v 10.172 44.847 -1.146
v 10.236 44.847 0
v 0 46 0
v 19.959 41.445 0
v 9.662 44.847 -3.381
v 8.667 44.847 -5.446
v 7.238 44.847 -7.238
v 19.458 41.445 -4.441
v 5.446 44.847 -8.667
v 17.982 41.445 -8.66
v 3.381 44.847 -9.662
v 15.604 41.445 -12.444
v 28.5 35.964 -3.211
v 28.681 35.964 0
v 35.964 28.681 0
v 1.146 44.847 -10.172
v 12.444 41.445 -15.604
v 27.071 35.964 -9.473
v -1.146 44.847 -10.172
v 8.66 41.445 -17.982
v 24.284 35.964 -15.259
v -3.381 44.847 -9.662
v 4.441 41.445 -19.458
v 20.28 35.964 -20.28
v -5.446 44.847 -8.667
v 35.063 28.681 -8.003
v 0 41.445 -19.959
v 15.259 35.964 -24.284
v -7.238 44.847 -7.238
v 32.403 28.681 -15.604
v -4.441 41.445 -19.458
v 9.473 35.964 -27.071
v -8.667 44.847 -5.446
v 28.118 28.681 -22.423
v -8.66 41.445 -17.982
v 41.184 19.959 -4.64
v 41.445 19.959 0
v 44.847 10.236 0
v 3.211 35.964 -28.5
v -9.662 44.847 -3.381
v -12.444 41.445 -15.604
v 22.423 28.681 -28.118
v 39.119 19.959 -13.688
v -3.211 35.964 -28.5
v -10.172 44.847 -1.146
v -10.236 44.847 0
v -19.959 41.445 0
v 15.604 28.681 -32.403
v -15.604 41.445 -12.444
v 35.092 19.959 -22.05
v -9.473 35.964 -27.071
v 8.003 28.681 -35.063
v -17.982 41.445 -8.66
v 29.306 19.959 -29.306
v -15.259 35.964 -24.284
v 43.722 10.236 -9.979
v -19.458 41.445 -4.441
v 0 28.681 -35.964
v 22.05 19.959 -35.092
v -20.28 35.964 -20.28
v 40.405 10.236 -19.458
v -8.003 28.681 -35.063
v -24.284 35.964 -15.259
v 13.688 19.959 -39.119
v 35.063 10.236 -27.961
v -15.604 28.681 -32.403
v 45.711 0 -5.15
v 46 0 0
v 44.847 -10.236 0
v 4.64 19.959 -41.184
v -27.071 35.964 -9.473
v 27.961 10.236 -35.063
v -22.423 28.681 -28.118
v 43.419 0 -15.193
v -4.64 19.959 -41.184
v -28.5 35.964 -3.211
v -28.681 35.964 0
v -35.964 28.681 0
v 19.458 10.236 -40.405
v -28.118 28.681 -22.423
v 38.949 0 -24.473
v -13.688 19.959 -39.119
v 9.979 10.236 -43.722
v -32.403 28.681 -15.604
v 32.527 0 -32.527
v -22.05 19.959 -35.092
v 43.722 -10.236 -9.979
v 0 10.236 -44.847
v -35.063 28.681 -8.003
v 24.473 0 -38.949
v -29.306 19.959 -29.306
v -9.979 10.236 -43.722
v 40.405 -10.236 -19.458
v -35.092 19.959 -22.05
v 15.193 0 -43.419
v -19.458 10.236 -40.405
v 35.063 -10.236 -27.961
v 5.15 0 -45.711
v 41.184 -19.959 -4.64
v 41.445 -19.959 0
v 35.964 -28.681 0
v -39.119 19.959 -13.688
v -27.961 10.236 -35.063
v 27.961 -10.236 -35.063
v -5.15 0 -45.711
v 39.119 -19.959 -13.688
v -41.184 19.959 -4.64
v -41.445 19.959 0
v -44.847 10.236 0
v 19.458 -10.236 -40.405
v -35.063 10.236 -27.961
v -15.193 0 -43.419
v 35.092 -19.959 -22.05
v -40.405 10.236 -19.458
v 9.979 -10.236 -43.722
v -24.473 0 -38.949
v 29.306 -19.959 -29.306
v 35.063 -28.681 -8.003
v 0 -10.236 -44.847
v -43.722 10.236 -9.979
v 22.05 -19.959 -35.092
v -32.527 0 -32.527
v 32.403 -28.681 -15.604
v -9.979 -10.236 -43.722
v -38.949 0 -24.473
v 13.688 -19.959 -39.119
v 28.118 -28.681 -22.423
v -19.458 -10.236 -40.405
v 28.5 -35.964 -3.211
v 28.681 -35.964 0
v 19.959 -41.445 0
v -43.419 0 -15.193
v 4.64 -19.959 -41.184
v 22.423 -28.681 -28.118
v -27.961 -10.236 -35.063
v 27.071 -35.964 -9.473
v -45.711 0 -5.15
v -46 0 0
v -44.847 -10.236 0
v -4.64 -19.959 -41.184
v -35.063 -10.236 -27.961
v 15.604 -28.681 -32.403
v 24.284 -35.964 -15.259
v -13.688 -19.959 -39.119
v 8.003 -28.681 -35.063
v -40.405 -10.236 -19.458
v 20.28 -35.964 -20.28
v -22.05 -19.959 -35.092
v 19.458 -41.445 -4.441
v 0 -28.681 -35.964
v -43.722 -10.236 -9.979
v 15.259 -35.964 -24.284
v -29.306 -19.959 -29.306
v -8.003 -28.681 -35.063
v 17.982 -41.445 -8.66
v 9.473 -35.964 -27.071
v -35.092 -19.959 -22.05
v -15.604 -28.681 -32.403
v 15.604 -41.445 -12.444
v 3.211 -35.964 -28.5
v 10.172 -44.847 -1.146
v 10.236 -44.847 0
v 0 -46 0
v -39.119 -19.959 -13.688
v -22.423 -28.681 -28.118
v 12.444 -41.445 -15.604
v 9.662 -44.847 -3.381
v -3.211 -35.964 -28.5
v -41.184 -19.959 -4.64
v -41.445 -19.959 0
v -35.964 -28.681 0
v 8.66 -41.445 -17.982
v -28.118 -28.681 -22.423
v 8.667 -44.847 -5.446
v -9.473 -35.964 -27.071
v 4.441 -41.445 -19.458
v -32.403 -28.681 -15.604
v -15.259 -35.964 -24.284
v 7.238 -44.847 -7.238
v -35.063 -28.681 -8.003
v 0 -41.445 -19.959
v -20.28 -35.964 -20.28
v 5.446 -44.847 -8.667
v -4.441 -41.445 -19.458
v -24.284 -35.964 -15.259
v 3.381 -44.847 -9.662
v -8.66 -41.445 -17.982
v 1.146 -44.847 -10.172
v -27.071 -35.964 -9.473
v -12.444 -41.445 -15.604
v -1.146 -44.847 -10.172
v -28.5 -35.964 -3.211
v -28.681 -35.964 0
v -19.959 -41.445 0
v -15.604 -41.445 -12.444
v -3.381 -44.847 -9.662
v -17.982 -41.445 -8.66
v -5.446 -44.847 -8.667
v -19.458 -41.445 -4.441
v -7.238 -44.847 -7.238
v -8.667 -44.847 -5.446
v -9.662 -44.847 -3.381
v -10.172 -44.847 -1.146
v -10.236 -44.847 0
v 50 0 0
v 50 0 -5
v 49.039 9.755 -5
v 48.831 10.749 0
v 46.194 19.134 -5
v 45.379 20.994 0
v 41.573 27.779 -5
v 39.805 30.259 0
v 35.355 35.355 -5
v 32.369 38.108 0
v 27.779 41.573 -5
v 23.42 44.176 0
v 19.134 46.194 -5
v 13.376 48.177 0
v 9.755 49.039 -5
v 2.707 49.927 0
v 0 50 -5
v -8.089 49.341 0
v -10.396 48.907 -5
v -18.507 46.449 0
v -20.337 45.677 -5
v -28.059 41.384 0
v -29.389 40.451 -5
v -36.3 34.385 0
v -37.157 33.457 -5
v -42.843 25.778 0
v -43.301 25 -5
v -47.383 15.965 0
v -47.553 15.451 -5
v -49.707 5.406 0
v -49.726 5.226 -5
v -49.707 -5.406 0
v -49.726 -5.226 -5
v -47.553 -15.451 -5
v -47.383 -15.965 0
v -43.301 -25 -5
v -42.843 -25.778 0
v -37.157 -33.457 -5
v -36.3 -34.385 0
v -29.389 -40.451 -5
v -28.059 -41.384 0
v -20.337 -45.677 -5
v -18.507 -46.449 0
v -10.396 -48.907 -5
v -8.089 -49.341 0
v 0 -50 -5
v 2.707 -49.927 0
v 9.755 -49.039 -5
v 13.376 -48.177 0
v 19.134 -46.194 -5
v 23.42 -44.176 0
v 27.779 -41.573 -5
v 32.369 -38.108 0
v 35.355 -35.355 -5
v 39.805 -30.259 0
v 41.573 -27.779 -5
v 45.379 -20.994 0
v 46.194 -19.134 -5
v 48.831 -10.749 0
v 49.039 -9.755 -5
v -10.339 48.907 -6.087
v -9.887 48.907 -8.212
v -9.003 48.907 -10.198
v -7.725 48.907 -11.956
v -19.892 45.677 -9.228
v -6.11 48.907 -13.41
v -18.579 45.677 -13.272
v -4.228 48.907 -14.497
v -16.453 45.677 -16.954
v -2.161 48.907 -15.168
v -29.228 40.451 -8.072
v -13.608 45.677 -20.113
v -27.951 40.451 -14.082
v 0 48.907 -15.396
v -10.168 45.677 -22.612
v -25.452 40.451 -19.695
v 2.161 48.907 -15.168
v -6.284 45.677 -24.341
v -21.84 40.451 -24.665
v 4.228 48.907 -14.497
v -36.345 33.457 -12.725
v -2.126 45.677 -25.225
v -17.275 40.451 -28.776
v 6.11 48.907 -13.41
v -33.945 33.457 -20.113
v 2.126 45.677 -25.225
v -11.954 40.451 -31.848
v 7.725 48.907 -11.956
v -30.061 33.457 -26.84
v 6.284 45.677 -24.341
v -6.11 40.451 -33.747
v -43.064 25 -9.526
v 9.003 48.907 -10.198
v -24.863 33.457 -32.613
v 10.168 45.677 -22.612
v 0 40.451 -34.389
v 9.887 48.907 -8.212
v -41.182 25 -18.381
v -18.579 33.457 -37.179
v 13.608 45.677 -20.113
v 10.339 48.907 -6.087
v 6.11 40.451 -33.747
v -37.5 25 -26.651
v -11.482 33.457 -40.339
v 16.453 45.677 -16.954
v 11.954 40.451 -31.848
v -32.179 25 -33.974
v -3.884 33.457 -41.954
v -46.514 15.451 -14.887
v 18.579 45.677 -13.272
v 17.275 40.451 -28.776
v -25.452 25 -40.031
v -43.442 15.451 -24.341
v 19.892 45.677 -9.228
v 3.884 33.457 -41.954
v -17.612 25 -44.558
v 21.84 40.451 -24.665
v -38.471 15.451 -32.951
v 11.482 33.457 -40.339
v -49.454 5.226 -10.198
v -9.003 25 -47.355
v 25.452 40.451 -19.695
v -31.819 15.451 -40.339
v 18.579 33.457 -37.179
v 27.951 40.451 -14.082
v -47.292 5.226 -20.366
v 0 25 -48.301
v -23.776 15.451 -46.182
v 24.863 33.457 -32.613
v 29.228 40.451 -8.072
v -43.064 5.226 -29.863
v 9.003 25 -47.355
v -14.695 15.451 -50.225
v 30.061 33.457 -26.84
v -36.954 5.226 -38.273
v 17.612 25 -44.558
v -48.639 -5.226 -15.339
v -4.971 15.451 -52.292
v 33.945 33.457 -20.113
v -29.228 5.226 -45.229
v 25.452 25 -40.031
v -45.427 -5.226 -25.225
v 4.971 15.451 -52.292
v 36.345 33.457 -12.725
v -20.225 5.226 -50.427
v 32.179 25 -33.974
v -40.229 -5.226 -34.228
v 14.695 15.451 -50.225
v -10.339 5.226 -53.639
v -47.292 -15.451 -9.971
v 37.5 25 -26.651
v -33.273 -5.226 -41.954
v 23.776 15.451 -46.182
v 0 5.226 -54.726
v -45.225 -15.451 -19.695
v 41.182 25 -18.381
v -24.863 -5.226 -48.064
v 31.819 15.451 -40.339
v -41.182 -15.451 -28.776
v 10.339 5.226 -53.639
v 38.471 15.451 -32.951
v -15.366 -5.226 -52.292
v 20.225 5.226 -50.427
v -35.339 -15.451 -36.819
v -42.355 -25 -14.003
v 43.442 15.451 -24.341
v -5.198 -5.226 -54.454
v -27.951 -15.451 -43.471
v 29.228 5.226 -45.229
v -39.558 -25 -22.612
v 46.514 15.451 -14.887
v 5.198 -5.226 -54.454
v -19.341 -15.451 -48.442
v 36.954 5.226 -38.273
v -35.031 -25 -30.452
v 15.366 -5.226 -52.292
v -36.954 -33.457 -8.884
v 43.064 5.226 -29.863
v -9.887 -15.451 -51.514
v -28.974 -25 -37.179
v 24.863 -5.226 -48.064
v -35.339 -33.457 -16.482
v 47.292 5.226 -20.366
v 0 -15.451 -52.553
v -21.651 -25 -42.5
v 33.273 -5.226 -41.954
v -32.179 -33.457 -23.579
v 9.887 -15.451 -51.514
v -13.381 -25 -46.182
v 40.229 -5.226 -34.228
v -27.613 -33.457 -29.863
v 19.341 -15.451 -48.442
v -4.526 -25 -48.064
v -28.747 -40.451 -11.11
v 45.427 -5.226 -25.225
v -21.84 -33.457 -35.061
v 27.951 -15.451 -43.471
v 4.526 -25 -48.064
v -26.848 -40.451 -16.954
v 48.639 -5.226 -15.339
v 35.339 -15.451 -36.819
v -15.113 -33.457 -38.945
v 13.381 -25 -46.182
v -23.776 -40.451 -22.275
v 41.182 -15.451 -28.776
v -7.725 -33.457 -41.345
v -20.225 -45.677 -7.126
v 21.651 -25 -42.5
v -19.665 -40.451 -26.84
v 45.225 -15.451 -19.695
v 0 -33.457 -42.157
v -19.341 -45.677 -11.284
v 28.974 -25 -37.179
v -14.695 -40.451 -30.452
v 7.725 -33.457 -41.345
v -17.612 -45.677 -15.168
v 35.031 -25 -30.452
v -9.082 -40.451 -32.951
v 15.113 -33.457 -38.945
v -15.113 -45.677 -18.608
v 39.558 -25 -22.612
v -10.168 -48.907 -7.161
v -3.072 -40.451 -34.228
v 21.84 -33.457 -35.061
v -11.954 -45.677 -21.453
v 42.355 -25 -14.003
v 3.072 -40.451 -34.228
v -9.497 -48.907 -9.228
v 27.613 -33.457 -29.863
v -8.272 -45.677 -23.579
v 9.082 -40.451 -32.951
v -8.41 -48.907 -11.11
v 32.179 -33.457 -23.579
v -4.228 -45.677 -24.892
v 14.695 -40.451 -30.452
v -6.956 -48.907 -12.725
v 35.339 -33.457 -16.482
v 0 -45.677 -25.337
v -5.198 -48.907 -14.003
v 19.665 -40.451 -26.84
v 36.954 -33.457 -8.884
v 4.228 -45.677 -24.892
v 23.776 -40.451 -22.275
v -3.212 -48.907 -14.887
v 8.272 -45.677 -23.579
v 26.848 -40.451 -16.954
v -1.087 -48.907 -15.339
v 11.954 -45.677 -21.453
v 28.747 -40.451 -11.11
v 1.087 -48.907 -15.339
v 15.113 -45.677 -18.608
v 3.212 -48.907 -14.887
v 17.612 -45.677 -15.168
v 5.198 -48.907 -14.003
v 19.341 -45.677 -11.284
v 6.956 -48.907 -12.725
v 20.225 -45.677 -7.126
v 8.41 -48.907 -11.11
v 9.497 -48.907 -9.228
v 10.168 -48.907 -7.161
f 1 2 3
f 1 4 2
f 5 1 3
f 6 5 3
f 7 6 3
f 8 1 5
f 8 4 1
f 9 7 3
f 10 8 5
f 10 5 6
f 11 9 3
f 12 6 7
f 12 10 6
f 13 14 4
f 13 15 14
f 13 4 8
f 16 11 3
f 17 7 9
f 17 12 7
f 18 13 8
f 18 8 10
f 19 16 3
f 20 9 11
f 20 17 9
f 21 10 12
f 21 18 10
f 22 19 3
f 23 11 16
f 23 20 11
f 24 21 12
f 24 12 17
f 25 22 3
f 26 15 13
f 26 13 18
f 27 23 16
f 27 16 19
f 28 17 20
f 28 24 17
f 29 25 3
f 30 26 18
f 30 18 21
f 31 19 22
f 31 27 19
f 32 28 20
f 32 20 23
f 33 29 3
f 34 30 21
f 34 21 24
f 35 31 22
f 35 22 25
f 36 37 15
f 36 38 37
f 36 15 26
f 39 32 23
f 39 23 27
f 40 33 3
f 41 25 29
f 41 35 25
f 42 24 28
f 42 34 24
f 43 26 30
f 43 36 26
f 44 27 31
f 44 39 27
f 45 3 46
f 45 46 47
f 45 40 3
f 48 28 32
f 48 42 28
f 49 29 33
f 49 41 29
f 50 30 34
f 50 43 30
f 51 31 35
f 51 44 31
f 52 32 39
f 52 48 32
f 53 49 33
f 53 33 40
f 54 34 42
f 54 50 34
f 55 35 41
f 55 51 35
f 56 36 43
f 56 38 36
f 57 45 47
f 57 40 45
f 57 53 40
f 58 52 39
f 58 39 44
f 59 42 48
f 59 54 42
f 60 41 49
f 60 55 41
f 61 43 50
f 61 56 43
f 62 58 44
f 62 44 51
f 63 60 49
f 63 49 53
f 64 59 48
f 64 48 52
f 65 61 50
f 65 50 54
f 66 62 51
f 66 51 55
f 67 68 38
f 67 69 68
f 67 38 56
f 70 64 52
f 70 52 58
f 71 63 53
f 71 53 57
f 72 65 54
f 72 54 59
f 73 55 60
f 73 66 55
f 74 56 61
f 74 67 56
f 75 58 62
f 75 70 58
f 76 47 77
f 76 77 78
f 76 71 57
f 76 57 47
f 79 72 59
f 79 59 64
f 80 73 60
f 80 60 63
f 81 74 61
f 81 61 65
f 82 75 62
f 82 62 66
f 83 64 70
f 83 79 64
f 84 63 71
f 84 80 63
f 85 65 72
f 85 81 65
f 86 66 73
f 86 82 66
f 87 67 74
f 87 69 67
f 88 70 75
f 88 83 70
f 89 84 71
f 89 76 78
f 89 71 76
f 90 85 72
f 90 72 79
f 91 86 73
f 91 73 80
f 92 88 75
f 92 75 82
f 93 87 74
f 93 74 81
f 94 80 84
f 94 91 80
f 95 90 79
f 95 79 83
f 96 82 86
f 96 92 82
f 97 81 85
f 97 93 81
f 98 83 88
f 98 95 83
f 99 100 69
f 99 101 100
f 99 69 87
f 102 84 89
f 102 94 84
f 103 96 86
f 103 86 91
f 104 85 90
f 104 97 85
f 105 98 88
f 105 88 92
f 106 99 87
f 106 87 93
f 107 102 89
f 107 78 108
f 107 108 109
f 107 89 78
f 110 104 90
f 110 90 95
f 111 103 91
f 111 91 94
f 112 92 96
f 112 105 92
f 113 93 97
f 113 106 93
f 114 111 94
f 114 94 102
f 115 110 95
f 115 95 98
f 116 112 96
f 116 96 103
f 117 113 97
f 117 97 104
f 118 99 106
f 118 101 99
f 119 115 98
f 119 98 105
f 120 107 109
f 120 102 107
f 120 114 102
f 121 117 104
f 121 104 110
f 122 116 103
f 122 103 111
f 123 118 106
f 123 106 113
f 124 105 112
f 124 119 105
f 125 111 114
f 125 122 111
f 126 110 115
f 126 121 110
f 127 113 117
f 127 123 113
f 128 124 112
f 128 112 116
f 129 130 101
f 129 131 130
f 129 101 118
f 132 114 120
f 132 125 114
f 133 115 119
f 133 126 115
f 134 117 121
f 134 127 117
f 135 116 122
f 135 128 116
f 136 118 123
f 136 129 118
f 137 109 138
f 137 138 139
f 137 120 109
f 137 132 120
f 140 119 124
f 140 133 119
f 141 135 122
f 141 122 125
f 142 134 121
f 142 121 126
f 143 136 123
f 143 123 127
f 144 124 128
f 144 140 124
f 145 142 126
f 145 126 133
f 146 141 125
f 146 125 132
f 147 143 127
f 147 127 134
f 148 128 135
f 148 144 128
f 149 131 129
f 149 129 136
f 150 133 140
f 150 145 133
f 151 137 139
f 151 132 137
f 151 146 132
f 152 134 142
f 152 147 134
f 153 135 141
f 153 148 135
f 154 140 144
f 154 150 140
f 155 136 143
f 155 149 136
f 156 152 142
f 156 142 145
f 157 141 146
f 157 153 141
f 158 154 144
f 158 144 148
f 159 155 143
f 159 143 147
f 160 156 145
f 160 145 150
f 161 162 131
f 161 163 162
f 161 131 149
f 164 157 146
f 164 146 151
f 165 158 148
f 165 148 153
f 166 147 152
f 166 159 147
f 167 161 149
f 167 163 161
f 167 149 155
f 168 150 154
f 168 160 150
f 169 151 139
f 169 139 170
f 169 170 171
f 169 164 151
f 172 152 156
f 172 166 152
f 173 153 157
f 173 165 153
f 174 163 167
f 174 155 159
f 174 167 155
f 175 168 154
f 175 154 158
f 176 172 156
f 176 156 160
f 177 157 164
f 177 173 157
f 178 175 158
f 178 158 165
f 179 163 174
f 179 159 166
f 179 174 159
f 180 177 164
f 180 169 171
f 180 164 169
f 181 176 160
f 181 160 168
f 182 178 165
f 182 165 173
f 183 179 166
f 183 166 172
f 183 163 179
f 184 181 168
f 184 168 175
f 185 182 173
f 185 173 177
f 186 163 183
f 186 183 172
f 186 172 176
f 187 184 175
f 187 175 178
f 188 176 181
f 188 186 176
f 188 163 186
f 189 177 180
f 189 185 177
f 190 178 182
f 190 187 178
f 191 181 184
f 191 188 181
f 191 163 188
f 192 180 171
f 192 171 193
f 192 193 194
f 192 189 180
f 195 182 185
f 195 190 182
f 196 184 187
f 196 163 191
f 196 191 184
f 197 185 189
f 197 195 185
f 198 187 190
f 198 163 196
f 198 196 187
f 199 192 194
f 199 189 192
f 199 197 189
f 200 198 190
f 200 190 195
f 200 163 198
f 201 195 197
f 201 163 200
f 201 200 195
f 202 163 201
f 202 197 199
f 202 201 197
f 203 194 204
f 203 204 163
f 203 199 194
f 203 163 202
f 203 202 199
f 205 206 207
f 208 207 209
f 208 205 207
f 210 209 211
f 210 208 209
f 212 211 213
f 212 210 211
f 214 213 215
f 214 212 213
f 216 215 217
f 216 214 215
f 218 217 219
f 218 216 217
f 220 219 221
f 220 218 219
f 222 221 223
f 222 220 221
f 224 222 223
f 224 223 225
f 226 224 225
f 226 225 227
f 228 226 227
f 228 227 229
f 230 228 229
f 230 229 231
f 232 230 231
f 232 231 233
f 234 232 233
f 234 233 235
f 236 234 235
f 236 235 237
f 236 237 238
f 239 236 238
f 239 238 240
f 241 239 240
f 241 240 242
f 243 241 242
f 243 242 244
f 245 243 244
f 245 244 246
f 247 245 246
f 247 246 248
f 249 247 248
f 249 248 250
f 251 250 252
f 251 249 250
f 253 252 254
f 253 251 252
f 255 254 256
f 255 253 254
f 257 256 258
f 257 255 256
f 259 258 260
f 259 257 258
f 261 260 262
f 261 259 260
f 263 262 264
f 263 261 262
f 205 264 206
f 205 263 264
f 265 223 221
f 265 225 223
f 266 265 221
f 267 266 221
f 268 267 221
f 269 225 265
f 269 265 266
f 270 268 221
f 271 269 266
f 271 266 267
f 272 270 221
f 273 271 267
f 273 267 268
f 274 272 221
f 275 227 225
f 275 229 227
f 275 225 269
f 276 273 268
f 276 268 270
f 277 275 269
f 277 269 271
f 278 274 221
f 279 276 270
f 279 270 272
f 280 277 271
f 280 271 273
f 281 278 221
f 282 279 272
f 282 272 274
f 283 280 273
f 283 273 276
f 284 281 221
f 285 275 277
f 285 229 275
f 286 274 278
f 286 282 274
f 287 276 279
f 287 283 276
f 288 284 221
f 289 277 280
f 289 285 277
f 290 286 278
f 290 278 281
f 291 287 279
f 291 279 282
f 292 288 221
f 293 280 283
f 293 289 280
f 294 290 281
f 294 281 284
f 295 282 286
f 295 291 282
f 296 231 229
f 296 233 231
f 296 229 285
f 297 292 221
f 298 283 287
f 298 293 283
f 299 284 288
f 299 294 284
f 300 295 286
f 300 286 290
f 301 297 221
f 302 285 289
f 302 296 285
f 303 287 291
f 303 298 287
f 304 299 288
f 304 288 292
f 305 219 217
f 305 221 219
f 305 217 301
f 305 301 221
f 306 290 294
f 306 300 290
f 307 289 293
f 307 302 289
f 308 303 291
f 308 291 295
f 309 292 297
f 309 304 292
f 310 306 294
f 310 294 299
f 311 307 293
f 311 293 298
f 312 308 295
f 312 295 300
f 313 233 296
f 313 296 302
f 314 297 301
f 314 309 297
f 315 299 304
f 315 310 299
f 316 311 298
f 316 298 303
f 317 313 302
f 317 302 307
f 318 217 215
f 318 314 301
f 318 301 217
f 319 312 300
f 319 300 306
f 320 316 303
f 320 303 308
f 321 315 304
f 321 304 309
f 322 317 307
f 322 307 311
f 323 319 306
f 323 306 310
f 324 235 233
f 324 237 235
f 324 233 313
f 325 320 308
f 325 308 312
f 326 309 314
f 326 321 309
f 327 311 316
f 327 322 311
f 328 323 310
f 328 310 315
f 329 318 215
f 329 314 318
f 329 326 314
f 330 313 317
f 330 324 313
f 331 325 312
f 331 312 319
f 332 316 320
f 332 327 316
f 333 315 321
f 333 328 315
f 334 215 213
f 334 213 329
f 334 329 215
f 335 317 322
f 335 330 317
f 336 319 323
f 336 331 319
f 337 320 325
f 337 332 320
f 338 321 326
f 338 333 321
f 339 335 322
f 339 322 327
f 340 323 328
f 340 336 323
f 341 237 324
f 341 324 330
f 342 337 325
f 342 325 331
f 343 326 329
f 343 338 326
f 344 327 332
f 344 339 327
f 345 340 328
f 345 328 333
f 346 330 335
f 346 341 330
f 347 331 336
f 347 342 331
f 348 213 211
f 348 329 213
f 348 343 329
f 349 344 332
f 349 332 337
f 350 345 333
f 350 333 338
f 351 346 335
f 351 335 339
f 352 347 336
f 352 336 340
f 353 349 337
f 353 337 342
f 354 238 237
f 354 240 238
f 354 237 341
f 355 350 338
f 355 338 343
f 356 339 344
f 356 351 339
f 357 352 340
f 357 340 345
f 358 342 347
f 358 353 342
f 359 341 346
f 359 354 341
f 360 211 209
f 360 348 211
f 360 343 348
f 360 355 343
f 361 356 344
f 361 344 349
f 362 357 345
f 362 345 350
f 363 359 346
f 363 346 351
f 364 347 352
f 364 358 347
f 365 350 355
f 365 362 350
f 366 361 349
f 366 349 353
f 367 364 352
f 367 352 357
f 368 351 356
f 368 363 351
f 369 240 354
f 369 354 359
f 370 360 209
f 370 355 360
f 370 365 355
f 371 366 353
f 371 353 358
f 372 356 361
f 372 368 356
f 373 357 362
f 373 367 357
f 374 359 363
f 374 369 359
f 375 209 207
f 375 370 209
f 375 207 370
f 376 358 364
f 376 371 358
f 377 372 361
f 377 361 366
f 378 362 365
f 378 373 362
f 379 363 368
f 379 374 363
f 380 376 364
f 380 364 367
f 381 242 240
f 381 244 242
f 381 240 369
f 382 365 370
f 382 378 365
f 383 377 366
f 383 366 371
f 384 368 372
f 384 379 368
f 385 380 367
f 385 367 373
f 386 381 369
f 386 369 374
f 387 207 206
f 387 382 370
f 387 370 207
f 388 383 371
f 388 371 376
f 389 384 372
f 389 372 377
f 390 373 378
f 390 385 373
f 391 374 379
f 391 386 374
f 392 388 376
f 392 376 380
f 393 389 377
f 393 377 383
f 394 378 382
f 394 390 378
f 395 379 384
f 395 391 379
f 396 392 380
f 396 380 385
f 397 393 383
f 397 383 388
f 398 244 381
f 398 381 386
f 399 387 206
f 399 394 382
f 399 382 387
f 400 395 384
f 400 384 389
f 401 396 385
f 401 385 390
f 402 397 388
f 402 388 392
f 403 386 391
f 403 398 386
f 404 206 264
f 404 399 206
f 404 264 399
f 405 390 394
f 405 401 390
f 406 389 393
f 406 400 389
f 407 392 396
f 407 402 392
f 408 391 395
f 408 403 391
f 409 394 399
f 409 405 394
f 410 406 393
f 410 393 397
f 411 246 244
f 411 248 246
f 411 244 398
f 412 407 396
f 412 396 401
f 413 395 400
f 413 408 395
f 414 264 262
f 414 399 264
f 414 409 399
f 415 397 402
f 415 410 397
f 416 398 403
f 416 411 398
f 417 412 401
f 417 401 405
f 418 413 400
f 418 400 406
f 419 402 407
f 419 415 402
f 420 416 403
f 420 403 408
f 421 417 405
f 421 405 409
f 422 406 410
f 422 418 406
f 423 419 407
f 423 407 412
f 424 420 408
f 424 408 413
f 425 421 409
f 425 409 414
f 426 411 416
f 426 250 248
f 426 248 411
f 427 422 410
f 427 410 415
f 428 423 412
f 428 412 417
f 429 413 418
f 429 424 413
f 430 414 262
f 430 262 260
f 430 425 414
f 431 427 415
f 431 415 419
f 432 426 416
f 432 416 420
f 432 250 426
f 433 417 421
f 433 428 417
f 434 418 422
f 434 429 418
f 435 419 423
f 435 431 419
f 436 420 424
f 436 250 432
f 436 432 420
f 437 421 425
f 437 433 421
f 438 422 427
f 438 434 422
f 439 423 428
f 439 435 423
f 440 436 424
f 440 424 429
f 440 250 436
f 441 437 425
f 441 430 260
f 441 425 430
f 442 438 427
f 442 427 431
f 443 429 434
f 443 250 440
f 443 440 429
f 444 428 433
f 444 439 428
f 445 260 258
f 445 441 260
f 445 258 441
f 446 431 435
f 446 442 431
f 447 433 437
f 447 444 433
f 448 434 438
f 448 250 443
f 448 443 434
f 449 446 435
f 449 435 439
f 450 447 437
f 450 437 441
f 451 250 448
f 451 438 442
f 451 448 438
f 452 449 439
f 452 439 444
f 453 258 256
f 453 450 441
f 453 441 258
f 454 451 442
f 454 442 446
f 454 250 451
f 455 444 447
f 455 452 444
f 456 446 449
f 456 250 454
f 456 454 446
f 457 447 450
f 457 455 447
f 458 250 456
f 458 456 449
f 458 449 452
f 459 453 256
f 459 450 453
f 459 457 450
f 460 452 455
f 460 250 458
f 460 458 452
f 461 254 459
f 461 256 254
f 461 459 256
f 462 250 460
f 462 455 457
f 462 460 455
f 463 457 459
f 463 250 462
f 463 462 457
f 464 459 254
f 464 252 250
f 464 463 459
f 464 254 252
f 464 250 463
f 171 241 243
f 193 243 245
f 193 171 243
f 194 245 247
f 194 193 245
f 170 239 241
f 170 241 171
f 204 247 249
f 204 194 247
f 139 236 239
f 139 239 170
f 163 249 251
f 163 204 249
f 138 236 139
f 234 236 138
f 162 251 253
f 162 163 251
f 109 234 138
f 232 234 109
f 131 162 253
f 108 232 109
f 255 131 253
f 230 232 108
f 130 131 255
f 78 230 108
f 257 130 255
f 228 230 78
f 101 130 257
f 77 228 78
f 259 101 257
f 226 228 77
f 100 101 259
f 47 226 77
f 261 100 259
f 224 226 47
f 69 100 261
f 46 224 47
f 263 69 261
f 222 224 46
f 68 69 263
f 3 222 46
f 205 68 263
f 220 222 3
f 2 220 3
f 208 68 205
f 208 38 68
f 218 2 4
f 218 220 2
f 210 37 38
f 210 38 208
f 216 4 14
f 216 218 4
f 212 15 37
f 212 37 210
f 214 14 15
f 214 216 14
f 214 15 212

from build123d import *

# Parameters (mm, degrees)
SKETCH1_R           = 50
BOSS_EXTRUDE1_DEPTH = 5
REVOLVE1_ANGLE      = 180


with BuildPart() as part:
    # Sketch1 → Boss-Extrude1 (new body)
    with BuildSketch(Plane.XY):
        Circle(SKETCH1_R)
    extrude(amount=-BOSS_EXTRUDE1_DEPTH)

    # Sketch2 → Revolve1 (revolve)
    with BuildSketch(Plane(origin=(0, 0, -5), x_dir=(-1, 0, 0), z_dir=(0, 0, -1))):
        with BuildLine():
            Line((0, -50), (0, 50))
            ThreePointArc((0, 50), (50, 0), (0, -50))
        make_face()
    revolve(axis=Axis((0, -50, -5), (0, -1, 0)), revolution_arc=REVOLVE1_ANGLE)

    # Sketch4 → Cut-Revolve1 (revolve, cut)
    with BuildSketch(Plane.XY):
        with BuildLine():
            Line((0, -46), (0, 46))
            ThreePointArc((0, 46), (46, 0), (0, -46))
        make_face()
    revolve(axis=Axis((0, -46, 0), (0, 1, 0)), mode=Mode.SUBTRACT)


solid = part.part
